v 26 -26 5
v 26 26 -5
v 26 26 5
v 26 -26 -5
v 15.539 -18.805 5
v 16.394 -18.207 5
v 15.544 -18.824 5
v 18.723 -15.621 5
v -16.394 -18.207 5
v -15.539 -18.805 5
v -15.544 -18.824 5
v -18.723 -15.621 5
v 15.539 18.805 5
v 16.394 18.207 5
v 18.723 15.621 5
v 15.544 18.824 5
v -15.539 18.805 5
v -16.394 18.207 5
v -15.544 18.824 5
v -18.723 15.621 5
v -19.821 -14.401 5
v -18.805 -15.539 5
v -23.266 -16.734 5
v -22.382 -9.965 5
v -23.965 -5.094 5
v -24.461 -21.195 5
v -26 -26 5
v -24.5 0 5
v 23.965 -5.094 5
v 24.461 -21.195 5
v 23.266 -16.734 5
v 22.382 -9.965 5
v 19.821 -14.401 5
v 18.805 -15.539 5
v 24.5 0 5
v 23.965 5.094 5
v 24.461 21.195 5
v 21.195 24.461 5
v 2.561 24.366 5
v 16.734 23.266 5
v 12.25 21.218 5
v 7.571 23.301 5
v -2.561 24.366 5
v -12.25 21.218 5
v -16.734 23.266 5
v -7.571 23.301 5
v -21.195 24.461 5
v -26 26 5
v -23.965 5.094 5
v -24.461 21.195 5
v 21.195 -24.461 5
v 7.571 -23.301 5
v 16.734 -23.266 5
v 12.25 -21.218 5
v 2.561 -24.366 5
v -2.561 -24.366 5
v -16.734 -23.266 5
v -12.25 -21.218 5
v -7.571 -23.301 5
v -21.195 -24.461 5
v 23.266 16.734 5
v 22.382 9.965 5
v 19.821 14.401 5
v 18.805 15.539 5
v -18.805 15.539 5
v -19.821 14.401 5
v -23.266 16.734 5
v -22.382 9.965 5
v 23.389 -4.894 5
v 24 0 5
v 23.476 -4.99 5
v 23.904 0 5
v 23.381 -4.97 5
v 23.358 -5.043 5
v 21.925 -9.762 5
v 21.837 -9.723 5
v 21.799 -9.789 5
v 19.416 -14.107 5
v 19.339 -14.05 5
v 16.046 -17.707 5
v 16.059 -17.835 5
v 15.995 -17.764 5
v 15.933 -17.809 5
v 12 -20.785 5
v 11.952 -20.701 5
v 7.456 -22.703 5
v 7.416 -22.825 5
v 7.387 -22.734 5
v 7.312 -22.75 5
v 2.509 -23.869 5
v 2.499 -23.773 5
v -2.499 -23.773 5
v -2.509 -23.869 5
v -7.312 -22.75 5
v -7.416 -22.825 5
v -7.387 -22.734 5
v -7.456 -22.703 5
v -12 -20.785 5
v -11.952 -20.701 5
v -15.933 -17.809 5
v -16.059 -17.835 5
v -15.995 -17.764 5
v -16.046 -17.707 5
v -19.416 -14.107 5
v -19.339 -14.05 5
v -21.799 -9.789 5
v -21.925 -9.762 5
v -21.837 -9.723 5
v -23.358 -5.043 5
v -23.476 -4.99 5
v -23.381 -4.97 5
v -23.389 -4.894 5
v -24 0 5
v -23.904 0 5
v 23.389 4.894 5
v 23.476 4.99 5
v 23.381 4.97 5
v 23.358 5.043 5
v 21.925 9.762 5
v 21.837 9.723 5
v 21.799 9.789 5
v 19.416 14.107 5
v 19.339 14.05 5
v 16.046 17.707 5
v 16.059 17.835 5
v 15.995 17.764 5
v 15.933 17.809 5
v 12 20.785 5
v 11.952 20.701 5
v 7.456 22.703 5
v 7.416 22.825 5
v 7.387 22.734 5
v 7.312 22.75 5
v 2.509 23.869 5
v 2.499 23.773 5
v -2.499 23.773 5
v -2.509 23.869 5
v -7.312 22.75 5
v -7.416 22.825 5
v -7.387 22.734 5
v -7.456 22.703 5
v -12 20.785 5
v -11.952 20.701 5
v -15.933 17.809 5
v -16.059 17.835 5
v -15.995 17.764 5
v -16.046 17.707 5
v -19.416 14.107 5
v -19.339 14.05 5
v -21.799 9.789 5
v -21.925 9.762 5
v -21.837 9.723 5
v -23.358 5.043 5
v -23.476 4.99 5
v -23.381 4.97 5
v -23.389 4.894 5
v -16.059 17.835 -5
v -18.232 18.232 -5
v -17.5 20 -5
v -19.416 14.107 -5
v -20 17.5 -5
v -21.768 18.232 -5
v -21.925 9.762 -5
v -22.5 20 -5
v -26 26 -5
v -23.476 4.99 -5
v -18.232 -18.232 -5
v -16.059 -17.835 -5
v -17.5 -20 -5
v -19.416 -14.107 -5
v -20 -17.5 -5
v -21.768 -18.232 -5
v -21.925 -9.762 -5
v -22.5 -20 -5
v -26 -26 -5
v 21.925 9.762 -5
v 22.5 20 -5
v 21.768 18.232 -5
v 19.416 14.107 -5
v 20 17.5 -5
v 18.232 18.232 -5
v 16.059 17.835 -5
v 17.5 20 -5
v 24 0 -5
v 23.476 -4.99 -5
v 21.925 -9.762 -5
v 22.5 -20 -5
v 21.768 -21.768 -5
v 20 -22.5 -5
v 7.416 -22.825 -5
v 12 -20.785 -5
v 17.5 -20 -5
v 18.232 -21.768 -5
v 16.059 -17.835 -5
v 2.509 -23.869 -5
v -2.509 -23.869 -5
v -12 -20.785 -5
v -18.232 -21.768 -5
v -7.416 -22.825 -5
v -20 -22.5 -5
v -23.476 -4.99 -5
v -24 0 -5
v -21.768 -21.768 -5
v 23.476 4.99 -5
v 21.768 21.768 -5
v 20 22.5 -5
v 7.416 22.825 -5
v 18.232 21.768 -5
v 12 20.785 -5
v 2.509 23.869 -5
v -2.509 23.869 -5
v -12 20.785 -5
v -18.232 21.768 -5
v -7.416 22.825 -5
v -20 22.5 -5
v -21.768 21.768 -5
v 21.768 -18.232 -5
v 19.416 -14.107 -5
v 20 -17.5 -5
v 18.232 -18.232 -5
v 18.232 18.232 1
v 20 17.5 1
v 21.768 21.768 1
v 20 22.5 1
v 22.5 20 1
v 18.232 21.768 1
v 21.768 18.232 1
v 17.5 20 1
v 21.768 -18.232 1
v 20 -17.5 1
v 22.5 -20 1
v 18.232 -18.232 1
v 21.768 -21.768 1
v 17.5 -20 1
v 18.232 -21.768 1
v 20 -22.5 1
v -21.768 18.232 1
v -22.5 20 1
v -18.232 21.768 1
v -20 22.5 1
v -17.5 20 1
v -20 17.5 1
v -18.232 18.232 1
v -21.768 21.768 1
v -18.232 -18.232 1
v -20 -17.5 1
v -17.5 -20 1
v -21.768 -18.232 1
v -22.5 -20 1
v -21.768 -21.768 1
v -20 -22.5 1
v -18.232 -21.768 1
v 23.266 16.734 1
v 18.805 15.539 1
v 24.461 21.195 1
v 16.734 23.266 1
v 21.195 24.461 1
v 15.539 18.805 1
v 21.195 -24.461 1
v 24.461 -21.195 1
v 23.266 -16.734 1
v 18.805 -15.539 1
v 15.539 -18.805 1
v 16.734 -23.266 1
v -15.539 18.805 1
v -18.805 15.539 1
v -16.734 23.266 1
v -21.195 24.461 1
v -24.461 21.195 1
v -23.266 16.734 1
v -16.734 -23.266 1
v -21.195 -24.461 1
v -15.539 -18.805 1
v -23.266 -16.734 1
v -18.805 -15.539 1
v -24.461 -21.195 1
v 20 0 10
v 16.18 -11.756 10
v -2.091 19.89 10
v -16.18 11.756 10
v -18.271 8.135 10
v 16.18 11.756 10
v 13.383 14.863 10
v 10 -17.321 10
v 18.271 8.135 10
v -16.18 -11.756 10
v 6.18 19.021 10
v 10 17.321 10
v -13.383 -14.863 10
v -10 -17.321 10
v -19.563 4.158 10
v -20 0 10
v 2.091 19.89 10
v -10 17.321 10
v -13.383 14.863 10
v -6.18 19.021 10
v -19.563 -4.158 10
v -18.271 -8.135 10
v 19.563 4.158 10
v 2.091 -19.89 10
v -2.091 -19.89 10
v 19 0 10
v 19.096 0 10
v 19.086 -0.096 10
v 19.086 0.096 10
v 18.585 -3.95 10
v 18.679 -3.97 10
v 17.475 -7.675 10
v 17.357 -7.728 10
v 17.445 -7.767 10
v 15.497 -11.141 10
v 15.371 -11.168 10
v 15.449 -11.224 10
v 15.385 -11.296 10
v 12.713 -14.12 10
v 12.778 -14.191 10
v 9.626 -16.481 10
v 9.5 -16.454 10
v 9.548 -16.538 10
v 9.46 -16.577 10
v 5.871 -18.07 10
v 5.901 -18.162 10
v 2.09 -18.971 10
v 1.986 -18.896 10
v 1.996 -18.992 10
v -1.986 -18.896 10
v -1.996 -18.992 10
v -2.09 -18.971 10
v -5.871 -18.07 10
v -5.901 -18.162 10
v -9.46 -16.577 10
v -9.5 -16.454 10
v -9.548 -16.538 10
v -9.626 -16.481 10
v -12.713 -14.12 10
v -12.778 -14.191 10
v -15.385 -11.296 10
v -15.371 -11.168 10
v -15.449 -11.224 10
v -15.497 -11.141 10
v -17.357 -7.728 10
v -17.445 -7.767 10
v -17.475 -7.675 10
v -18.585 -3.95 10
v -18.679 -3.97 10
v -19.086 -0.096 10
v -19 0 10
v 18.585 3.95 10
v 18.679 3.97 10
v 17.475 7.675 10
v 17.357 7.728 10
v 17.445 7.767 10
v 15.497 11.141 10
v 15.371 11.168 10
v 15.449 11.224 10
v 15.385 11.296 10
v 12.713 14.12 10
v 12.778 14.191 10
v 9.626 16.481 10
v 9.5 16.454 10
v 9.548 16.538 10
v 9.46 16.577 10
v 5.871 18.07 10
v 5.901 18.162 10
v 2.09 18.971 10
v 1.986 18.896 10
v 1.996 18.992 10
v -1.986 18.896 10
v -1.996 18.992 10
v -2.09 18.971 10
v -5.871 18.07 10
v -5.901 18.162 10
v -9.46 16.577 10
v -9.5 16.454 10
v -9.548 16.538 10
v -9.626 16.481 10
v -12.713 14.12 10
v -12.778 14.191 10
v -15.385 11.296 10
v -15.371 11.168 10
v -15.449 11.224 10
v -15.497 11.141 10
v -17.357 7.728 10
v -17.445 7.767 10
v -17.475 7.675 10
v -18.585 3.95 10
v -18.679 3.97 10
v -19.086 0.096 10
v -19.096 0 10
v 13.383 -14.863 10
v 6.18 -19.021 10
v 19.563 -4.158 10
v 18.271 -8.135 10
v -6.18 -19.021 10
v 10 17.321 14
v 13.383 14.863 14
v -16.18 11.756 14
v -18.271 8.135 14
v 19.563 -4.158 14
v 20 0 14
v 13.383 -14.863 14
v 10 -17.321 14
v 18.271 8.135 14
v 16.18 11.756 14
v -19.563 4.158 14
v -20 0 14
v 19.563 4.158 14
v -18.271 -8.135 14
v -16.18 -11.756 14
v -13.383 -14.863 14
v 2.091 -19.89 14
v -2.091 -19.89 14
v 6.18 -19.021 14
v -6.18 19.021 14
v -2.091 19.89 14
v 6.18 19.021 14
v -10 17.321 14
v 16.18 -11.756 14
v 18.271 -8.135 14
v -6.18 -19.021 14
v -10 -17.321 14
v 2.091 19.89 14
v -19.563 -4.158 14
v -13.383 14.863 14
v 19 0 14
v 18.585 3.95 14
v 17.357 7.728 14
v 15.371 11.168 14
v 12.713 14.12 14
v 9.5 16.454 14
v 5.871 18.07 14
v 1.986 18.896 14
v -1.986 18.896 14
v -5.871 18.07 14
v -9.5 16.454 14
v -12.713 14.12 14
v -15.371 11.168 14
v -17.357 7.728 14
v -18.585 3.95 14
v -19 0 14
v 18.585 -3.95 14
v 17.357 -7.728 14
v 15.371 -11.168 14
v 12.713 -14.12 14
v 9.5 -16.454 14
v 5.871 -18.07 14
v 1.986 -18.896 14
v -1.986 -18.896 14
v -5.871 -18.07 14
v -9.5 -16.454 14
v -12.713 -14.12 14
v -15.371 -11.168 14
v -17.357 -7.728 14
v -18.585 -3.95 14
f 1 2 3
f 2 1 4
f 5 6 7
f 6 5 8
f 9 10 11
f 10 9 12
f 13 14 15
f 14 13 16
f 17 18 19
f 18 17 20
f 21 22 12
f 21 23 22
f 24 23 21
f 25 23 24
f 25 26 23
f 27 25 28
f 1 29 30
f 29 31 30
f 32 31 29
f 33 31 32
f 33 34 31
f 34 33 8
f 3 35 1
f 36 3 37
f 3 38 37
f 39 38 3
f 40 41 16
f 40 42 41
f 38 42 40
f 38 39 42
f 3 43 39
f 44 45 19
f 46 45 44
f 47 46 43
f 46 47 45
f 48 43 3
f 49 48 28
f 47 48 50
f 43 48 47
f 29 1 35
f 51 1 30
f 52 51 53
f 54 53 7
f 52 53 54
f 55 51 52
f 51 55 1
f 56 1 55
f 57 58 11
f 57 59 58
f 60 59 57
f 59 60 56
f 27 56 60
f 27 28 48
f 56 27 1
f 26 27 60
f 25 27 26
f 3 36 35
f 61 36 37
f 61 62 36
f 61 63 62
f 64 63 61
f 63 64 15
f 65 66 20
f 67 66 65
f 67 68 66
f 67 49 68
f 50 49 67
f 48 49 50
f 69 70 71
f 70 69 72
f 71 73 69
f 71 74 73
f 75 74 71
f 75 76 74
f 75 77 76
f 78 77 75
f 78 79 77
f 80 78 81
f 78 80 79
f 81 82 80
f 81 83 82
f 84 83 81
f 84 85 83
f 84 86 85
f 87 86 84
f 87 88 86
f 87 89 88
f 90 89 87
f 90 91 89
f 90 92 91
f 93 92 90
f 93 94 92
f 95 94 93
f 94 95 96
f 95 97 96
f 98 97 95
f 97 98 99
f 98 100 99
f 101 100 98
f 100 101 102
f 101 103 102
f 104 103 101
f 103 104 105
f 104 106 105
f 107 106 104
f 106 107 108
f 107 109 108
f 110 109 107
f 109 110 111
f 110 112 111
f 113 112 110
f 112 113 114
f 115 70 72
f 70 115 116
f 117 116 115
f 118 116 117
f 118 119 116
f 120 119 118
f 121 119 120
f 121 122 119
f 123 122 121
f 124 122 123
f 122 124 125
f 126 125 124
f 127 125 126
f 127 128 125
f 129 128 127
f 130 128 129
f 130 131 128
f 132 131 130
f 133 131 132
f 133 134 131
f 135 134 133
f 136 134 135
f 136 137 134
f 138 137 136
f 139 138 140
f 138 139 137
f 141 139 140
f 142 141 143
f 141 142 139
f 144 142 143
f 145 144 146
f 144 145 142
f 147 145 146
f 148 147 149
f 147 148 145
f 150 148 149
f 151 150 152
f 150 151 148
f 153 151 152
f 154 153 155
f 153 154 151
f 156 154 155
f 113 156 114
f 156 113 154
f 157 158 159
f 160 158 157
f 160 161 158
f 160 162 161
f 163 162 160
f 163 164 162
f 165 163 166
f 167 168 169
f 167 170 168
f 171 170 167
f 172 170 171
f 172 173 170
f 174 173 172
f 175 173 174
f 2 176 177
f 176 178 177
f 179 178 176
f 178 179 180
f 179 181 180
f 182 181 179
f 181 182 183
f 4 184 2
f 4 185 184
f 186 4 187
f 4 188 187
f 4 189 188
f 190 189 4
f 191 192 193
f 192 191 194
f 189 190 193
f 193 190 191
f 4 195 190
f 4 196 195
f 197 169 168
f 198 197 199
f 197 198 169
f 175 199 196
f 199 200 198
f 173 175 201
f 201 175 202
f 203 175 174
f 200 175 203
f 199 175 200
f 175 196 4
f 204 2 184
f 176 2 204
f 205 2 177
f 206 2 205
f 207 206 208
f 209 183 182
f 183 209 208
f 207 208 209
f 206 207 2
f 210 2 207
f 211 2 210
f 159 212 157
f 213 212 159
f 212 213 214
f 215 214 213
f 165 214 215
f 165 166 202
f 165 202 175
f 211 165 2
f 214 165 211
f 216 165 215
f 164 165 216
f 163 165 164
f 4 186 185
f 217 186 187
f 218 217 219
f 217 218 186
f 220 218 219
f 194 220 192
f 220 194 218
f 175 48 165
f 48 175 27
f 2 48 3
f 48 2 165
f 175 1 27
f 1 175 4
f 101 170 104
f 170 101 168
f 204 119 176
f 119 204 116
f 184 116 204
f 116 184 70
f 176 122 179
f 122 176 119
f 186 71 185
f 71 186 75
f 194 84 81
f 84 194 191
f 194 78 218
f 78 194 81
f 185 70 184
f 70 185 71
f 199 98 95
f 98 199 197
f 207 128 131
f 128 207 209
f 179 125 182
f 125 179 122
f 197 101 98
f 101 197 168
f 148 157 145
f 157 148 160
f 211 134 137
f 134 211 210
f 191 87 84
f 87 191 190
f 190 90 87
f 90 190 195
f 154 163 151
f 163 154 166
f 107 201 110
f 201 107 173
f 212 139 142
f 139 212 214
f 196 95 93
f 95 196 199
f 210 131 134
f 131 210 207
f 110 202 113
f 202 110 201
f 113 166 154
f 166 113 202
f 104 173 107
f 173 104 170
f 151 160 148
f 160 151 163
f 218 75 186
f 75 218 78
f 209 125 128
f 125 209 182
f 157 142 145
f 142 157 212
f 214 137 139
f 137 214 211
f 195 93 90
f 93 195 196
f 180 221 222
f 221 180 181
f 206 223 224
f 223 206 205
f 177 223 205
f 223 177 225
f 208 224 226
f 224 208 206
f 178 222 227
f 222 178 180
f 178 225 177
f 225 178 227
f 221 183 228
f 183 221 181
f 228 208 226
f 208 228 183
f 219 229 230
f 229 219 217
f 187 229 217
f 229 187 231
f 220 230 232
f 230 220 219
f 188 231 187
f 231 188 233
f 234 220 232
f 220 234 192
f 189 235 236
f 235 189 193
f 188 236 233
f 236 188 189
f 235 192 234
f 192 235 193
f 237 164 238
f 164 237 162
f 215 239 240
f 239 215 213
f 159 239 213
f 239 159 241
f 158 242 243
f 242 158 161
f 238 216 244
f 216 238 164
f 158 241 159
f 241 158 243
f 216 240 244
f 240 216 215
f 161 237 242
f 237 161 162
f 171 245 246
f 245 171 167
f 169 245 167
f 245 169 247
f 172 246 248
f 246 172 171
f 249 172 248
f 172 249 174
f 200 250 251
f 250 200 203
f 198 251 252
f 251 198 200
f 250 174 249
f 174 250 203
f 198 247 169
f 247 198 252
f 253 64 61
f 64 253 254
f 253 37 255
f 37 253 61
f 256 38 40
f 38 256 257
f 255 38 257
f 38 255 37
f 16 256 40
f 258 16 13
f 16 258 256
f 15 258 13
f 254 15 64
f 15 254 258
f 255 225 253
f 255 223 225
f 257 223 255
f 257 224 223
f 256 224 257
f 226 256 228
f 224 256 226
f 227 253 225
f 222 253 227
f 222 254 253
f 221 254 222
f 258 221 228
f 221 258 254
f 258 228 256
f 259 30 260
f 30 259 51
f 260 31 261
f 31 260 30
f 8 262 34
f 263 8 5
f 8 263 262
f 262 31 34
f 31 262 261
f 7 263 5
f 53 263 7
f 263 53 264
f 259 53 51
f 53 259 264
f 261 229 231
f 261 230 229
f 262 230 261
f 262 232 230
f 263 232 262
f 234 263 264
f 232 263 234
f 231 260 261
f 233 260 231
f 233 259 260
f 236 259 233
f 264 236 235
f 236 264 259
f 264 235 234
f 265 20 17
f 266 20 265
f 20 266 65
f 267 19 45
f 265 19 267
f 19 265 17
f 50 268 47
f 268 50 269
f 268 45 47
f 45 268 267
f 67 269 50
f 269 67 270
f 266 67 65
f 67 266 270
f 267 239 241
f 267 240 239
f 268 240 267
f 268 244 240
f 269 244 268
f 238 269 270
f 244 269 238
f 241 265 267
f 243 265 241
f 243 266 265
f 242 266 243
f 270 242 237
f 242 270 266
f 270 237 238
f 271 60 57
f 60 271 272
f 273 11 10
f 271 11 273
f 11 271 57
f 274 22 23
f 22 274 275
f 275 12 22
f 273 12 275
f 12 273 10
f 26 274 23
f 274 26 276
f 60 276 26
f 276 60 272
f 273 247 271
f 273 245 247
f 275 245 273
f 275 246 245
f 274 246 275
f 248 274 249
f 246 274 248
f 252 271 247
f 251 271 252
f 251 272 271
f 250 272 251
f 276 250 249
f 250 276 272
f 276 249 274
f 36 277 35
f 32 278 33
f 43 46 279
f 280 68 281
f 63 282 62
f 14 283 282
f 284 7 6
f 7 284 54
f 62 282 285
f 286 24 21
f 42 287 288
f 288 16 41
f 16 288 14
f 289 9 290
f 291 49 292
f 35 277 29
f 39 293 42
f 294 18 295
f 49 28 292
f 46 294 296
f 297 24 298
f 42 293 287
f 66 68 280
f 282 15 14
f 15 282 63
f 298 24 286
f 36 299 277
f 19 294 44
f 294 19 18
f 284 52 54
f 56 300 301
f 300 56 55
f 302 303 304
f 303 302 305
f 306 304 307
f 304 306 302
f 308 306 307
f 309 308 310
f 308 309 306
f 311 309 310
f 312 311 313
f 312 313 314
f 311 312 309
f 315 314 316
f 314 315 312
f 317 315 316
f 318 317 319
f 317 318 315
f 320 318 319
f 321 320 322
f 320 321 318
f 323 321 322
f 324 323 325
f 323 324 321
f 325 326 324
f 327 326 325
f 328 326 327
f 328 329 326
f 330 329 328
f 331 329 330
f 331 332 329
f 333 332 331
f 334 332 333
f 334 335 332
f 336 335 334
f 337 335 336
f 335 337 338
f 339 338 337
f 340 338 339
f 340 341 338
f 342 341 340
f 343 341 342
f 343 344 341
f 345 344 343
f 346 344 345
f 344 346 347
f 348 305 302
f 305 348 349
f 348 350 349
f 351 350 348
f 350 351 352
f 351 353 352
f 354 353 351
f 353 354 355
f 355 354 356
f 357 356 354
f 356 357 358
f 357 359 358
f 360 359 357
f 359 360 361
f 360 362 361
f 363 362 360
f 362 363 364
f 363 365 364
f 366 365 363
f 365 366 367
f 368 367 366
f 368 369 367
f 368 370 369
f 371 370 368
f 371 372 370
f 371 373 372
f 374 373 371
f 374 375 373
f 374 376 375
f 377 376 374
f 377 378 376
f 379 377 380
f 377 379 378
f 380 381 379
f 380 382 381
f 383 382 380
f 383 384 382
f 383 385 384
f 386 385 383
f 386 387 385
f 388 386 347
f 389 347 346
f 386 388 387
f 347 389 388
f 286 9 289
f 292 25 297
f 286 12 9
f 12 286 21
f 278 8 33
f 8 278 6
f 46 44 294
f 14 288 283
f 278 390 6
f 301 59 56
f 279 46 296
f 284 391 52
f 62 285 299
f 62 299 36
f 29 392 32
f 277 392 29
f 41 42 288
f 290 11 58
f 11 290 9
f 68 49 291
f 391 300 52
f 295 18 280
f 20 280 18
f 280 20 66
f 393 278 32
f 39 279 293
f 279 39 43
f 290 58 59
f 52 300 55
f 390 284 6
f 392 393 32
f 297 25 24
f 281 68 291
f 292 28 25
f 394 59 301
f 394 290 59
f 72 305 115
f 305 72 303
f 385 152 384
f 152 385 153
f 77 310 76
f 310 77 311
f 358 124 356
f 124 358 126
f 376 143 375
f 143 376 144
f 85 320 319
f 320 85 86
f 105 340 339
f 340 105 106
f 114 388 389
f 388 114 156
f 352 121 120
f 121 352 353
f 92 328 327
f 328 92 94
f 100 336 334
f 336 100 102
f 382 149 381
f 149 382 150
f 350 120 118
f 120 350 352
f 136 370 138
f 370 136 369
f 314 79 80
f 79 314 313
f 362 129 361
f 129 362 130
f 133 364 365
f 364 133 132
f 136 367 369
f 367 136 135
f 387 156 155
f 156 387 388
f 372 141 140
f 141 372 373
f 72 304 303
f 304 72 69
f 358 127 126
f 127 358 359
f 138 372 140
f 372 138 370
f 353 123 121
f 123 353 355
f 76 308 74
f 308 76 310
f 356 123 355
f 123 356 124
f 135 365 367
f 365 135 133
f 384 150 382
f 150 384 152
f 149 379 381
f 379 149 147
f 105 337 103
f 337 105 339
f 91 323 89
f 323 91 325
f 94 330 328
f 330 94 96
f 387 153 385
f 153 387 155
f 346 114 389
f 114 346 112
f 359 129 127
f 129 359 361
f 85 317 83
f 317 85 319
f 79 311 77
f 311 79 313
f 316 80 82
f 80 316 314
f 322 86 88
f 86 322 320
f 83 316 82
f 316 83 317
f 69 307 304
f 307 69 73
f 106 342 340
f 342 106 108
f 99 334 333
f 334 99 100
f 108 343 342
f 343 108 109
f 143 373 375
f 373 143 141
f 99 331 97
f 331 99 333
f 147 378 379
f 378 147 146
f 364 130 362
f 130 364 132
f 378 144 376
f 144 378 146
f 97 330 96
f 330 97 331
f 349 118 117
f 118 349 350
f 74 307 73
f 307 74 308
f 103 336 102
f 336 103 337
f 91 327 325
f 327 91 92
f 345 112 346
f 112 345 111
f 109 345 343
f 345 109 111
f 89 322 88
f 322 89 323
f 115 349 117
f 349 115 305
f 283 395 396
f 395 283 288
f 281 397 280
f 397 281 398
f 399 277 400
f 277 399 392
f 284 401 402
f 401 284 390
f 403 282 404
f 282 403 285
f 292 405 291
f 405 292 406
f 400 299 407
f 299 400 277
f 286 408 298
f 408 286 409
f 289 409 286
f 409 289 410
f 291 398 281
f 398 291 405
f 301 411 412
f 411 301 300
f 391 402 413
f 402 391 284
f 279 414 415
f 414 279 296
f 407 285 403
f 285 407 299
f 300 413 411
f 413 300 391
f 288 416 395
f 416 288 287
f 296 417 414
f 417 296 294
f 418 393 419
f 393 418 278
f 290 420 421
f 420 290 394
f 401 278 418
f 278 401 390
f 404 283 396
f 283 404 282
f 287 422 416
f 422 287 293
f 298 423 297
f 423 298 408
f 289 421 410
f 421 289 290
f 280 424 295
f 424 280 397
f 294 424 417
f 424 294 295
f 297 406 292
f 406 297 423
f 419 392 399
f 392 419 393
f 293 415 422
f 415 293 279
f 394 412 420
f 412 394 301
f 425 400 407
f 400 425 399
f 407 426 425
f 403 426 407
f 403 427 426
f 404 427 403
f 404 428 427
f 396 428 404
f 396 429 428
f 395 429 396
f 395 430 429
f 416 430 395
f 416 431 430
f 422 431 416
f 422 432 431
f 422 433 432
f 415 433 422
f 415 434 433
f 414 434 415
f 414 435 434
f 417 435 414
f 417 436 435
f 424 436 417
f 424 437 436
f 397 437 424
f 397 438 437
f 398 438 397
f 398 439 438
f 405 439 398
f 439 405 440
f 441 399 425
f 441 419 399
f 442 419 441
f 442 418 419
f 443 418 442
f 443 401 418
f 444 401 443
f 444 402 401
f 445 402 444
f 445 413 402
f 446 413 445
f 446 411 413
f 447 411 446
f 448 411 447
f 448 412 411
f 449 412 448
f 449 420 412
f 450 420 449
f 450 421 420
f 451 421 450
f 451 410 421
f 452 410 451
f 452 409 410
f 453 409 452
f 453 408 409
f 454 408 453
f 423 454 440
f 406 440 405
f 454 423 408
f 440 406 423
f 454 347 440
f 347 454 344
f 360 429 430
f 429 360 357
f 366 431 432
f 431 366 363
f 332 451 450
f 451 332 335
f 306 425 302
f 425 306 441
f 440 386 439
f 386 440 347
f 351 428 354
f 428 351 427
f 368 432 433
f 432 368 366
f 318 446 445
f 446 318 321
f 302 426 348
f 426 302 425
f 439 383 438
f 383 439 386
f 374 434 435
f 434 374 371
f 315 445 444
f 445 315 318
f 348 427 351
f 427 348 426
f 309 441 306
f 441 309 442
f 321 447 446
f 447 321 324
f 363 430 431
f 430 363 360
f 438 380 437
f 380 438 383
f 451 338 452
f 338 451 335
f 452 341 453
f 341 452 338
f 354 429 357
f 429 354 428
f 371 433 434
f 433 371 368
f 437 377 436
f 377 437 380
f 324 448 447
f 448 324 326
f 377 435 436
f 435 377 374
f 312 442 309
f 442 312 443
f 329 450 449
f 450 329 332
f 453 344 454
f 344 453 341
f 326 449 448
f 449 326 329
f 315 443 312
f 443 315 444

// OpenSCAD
cube_x = 52; //Width of the base
cube_y = 52; //Length of the base
cube_z = 10; //Height of the base
hole_size = 40;  //The diameter of the hole on the box itself
fan_diameter = 48; //The diameter of the fan blade

cone_height = 5; //Height of the cone part
cylinder_height = 4; //Height of the straight pipe part
screw_z_offset = -1*(cube_z+1)/2; //Z offset for the screw holes
edge_length_hex = 4; //The intended length from the center to an edge
adjusted_radius = edge_length_hex * 2 / sqrt(3); //The adjusted 'cylinder' radius so the center to edge will be the edge_length_hex
nut_height = 4; //The height of the nut

union() {
    //The cube base and the screw holes
    difference() {
        cube([cube_x,cube_y,cube_z], center=true); //Base cube
        cylinder(cube_z+1,d=fan_diameter, center = true); //Fan cutout
        
        //Screw cutouts
        translate([20,20,screw_z_offset]){
            cylinder(cube_z+1,d=5);
        }
        translate([20,-20,screw_z_offset]){
            cylinder(cube_z+1,d=5);
        }
        translate([-20,20,screw_z_offset]){
            cylinder(cube_z+1,d=5);
        }
        translate([-20,-20,screw_z_offset]){
            cylinder(cube_z+1,d=5);
        }
        
        //The nut holes
        translate([20, 20,cube_z/2 - nut_height]){
            rotate([0,0,15]){
                cylinder(r=adjusted_radius, h=nut_height + 0.1, $fn=6);
            }
        }
        translate([20, -20,cube_z/2 - nut_height]){
            rotate([0,0,45]){
                cylinder(r=adjusted_radius, h=nut_height + 0.1, $fn=6);
            }
        }
        translate([-20, 20,cube_z/2 - nut_height]){
            rotate([0,0,45]){
                cylinder(r=adjusted_radius, h=nut_height + 0.1, $fn=6);
            }
        }
        translate([-20, -20,cube_z/2 - nut_height]){
            rotate([0,0,15]){
                cylinder(r=adjusted_radius, h=nut_height + 0.1, $fn=6);
            }
        }
    }
    //The cone section
    difference(){
        translate([0,0,cube_z/2]){
            cylinder(cone_height, r1 = fan_diameter/2 + 0.5, r2 = hole_size/2);
        }
        translate([0,0,cube_z/2-0.1]){
            cylinder(cone_height+0.2, r1 = fan_diameter/2, r2 = hole_size/2-1);
        }
    }
    //The straight pipe section
    difference(){
        translate([0, 0, cone_height + cube_z/2]){
            cylinder(cylinder_height, d = hole_size);
        }
        
        translate([0, 0, cone_height + cube_z/2 - 0.1]){
            cylinder(cylinder_height + 0.2, d = hole_size - 2);
        }
    }
}
